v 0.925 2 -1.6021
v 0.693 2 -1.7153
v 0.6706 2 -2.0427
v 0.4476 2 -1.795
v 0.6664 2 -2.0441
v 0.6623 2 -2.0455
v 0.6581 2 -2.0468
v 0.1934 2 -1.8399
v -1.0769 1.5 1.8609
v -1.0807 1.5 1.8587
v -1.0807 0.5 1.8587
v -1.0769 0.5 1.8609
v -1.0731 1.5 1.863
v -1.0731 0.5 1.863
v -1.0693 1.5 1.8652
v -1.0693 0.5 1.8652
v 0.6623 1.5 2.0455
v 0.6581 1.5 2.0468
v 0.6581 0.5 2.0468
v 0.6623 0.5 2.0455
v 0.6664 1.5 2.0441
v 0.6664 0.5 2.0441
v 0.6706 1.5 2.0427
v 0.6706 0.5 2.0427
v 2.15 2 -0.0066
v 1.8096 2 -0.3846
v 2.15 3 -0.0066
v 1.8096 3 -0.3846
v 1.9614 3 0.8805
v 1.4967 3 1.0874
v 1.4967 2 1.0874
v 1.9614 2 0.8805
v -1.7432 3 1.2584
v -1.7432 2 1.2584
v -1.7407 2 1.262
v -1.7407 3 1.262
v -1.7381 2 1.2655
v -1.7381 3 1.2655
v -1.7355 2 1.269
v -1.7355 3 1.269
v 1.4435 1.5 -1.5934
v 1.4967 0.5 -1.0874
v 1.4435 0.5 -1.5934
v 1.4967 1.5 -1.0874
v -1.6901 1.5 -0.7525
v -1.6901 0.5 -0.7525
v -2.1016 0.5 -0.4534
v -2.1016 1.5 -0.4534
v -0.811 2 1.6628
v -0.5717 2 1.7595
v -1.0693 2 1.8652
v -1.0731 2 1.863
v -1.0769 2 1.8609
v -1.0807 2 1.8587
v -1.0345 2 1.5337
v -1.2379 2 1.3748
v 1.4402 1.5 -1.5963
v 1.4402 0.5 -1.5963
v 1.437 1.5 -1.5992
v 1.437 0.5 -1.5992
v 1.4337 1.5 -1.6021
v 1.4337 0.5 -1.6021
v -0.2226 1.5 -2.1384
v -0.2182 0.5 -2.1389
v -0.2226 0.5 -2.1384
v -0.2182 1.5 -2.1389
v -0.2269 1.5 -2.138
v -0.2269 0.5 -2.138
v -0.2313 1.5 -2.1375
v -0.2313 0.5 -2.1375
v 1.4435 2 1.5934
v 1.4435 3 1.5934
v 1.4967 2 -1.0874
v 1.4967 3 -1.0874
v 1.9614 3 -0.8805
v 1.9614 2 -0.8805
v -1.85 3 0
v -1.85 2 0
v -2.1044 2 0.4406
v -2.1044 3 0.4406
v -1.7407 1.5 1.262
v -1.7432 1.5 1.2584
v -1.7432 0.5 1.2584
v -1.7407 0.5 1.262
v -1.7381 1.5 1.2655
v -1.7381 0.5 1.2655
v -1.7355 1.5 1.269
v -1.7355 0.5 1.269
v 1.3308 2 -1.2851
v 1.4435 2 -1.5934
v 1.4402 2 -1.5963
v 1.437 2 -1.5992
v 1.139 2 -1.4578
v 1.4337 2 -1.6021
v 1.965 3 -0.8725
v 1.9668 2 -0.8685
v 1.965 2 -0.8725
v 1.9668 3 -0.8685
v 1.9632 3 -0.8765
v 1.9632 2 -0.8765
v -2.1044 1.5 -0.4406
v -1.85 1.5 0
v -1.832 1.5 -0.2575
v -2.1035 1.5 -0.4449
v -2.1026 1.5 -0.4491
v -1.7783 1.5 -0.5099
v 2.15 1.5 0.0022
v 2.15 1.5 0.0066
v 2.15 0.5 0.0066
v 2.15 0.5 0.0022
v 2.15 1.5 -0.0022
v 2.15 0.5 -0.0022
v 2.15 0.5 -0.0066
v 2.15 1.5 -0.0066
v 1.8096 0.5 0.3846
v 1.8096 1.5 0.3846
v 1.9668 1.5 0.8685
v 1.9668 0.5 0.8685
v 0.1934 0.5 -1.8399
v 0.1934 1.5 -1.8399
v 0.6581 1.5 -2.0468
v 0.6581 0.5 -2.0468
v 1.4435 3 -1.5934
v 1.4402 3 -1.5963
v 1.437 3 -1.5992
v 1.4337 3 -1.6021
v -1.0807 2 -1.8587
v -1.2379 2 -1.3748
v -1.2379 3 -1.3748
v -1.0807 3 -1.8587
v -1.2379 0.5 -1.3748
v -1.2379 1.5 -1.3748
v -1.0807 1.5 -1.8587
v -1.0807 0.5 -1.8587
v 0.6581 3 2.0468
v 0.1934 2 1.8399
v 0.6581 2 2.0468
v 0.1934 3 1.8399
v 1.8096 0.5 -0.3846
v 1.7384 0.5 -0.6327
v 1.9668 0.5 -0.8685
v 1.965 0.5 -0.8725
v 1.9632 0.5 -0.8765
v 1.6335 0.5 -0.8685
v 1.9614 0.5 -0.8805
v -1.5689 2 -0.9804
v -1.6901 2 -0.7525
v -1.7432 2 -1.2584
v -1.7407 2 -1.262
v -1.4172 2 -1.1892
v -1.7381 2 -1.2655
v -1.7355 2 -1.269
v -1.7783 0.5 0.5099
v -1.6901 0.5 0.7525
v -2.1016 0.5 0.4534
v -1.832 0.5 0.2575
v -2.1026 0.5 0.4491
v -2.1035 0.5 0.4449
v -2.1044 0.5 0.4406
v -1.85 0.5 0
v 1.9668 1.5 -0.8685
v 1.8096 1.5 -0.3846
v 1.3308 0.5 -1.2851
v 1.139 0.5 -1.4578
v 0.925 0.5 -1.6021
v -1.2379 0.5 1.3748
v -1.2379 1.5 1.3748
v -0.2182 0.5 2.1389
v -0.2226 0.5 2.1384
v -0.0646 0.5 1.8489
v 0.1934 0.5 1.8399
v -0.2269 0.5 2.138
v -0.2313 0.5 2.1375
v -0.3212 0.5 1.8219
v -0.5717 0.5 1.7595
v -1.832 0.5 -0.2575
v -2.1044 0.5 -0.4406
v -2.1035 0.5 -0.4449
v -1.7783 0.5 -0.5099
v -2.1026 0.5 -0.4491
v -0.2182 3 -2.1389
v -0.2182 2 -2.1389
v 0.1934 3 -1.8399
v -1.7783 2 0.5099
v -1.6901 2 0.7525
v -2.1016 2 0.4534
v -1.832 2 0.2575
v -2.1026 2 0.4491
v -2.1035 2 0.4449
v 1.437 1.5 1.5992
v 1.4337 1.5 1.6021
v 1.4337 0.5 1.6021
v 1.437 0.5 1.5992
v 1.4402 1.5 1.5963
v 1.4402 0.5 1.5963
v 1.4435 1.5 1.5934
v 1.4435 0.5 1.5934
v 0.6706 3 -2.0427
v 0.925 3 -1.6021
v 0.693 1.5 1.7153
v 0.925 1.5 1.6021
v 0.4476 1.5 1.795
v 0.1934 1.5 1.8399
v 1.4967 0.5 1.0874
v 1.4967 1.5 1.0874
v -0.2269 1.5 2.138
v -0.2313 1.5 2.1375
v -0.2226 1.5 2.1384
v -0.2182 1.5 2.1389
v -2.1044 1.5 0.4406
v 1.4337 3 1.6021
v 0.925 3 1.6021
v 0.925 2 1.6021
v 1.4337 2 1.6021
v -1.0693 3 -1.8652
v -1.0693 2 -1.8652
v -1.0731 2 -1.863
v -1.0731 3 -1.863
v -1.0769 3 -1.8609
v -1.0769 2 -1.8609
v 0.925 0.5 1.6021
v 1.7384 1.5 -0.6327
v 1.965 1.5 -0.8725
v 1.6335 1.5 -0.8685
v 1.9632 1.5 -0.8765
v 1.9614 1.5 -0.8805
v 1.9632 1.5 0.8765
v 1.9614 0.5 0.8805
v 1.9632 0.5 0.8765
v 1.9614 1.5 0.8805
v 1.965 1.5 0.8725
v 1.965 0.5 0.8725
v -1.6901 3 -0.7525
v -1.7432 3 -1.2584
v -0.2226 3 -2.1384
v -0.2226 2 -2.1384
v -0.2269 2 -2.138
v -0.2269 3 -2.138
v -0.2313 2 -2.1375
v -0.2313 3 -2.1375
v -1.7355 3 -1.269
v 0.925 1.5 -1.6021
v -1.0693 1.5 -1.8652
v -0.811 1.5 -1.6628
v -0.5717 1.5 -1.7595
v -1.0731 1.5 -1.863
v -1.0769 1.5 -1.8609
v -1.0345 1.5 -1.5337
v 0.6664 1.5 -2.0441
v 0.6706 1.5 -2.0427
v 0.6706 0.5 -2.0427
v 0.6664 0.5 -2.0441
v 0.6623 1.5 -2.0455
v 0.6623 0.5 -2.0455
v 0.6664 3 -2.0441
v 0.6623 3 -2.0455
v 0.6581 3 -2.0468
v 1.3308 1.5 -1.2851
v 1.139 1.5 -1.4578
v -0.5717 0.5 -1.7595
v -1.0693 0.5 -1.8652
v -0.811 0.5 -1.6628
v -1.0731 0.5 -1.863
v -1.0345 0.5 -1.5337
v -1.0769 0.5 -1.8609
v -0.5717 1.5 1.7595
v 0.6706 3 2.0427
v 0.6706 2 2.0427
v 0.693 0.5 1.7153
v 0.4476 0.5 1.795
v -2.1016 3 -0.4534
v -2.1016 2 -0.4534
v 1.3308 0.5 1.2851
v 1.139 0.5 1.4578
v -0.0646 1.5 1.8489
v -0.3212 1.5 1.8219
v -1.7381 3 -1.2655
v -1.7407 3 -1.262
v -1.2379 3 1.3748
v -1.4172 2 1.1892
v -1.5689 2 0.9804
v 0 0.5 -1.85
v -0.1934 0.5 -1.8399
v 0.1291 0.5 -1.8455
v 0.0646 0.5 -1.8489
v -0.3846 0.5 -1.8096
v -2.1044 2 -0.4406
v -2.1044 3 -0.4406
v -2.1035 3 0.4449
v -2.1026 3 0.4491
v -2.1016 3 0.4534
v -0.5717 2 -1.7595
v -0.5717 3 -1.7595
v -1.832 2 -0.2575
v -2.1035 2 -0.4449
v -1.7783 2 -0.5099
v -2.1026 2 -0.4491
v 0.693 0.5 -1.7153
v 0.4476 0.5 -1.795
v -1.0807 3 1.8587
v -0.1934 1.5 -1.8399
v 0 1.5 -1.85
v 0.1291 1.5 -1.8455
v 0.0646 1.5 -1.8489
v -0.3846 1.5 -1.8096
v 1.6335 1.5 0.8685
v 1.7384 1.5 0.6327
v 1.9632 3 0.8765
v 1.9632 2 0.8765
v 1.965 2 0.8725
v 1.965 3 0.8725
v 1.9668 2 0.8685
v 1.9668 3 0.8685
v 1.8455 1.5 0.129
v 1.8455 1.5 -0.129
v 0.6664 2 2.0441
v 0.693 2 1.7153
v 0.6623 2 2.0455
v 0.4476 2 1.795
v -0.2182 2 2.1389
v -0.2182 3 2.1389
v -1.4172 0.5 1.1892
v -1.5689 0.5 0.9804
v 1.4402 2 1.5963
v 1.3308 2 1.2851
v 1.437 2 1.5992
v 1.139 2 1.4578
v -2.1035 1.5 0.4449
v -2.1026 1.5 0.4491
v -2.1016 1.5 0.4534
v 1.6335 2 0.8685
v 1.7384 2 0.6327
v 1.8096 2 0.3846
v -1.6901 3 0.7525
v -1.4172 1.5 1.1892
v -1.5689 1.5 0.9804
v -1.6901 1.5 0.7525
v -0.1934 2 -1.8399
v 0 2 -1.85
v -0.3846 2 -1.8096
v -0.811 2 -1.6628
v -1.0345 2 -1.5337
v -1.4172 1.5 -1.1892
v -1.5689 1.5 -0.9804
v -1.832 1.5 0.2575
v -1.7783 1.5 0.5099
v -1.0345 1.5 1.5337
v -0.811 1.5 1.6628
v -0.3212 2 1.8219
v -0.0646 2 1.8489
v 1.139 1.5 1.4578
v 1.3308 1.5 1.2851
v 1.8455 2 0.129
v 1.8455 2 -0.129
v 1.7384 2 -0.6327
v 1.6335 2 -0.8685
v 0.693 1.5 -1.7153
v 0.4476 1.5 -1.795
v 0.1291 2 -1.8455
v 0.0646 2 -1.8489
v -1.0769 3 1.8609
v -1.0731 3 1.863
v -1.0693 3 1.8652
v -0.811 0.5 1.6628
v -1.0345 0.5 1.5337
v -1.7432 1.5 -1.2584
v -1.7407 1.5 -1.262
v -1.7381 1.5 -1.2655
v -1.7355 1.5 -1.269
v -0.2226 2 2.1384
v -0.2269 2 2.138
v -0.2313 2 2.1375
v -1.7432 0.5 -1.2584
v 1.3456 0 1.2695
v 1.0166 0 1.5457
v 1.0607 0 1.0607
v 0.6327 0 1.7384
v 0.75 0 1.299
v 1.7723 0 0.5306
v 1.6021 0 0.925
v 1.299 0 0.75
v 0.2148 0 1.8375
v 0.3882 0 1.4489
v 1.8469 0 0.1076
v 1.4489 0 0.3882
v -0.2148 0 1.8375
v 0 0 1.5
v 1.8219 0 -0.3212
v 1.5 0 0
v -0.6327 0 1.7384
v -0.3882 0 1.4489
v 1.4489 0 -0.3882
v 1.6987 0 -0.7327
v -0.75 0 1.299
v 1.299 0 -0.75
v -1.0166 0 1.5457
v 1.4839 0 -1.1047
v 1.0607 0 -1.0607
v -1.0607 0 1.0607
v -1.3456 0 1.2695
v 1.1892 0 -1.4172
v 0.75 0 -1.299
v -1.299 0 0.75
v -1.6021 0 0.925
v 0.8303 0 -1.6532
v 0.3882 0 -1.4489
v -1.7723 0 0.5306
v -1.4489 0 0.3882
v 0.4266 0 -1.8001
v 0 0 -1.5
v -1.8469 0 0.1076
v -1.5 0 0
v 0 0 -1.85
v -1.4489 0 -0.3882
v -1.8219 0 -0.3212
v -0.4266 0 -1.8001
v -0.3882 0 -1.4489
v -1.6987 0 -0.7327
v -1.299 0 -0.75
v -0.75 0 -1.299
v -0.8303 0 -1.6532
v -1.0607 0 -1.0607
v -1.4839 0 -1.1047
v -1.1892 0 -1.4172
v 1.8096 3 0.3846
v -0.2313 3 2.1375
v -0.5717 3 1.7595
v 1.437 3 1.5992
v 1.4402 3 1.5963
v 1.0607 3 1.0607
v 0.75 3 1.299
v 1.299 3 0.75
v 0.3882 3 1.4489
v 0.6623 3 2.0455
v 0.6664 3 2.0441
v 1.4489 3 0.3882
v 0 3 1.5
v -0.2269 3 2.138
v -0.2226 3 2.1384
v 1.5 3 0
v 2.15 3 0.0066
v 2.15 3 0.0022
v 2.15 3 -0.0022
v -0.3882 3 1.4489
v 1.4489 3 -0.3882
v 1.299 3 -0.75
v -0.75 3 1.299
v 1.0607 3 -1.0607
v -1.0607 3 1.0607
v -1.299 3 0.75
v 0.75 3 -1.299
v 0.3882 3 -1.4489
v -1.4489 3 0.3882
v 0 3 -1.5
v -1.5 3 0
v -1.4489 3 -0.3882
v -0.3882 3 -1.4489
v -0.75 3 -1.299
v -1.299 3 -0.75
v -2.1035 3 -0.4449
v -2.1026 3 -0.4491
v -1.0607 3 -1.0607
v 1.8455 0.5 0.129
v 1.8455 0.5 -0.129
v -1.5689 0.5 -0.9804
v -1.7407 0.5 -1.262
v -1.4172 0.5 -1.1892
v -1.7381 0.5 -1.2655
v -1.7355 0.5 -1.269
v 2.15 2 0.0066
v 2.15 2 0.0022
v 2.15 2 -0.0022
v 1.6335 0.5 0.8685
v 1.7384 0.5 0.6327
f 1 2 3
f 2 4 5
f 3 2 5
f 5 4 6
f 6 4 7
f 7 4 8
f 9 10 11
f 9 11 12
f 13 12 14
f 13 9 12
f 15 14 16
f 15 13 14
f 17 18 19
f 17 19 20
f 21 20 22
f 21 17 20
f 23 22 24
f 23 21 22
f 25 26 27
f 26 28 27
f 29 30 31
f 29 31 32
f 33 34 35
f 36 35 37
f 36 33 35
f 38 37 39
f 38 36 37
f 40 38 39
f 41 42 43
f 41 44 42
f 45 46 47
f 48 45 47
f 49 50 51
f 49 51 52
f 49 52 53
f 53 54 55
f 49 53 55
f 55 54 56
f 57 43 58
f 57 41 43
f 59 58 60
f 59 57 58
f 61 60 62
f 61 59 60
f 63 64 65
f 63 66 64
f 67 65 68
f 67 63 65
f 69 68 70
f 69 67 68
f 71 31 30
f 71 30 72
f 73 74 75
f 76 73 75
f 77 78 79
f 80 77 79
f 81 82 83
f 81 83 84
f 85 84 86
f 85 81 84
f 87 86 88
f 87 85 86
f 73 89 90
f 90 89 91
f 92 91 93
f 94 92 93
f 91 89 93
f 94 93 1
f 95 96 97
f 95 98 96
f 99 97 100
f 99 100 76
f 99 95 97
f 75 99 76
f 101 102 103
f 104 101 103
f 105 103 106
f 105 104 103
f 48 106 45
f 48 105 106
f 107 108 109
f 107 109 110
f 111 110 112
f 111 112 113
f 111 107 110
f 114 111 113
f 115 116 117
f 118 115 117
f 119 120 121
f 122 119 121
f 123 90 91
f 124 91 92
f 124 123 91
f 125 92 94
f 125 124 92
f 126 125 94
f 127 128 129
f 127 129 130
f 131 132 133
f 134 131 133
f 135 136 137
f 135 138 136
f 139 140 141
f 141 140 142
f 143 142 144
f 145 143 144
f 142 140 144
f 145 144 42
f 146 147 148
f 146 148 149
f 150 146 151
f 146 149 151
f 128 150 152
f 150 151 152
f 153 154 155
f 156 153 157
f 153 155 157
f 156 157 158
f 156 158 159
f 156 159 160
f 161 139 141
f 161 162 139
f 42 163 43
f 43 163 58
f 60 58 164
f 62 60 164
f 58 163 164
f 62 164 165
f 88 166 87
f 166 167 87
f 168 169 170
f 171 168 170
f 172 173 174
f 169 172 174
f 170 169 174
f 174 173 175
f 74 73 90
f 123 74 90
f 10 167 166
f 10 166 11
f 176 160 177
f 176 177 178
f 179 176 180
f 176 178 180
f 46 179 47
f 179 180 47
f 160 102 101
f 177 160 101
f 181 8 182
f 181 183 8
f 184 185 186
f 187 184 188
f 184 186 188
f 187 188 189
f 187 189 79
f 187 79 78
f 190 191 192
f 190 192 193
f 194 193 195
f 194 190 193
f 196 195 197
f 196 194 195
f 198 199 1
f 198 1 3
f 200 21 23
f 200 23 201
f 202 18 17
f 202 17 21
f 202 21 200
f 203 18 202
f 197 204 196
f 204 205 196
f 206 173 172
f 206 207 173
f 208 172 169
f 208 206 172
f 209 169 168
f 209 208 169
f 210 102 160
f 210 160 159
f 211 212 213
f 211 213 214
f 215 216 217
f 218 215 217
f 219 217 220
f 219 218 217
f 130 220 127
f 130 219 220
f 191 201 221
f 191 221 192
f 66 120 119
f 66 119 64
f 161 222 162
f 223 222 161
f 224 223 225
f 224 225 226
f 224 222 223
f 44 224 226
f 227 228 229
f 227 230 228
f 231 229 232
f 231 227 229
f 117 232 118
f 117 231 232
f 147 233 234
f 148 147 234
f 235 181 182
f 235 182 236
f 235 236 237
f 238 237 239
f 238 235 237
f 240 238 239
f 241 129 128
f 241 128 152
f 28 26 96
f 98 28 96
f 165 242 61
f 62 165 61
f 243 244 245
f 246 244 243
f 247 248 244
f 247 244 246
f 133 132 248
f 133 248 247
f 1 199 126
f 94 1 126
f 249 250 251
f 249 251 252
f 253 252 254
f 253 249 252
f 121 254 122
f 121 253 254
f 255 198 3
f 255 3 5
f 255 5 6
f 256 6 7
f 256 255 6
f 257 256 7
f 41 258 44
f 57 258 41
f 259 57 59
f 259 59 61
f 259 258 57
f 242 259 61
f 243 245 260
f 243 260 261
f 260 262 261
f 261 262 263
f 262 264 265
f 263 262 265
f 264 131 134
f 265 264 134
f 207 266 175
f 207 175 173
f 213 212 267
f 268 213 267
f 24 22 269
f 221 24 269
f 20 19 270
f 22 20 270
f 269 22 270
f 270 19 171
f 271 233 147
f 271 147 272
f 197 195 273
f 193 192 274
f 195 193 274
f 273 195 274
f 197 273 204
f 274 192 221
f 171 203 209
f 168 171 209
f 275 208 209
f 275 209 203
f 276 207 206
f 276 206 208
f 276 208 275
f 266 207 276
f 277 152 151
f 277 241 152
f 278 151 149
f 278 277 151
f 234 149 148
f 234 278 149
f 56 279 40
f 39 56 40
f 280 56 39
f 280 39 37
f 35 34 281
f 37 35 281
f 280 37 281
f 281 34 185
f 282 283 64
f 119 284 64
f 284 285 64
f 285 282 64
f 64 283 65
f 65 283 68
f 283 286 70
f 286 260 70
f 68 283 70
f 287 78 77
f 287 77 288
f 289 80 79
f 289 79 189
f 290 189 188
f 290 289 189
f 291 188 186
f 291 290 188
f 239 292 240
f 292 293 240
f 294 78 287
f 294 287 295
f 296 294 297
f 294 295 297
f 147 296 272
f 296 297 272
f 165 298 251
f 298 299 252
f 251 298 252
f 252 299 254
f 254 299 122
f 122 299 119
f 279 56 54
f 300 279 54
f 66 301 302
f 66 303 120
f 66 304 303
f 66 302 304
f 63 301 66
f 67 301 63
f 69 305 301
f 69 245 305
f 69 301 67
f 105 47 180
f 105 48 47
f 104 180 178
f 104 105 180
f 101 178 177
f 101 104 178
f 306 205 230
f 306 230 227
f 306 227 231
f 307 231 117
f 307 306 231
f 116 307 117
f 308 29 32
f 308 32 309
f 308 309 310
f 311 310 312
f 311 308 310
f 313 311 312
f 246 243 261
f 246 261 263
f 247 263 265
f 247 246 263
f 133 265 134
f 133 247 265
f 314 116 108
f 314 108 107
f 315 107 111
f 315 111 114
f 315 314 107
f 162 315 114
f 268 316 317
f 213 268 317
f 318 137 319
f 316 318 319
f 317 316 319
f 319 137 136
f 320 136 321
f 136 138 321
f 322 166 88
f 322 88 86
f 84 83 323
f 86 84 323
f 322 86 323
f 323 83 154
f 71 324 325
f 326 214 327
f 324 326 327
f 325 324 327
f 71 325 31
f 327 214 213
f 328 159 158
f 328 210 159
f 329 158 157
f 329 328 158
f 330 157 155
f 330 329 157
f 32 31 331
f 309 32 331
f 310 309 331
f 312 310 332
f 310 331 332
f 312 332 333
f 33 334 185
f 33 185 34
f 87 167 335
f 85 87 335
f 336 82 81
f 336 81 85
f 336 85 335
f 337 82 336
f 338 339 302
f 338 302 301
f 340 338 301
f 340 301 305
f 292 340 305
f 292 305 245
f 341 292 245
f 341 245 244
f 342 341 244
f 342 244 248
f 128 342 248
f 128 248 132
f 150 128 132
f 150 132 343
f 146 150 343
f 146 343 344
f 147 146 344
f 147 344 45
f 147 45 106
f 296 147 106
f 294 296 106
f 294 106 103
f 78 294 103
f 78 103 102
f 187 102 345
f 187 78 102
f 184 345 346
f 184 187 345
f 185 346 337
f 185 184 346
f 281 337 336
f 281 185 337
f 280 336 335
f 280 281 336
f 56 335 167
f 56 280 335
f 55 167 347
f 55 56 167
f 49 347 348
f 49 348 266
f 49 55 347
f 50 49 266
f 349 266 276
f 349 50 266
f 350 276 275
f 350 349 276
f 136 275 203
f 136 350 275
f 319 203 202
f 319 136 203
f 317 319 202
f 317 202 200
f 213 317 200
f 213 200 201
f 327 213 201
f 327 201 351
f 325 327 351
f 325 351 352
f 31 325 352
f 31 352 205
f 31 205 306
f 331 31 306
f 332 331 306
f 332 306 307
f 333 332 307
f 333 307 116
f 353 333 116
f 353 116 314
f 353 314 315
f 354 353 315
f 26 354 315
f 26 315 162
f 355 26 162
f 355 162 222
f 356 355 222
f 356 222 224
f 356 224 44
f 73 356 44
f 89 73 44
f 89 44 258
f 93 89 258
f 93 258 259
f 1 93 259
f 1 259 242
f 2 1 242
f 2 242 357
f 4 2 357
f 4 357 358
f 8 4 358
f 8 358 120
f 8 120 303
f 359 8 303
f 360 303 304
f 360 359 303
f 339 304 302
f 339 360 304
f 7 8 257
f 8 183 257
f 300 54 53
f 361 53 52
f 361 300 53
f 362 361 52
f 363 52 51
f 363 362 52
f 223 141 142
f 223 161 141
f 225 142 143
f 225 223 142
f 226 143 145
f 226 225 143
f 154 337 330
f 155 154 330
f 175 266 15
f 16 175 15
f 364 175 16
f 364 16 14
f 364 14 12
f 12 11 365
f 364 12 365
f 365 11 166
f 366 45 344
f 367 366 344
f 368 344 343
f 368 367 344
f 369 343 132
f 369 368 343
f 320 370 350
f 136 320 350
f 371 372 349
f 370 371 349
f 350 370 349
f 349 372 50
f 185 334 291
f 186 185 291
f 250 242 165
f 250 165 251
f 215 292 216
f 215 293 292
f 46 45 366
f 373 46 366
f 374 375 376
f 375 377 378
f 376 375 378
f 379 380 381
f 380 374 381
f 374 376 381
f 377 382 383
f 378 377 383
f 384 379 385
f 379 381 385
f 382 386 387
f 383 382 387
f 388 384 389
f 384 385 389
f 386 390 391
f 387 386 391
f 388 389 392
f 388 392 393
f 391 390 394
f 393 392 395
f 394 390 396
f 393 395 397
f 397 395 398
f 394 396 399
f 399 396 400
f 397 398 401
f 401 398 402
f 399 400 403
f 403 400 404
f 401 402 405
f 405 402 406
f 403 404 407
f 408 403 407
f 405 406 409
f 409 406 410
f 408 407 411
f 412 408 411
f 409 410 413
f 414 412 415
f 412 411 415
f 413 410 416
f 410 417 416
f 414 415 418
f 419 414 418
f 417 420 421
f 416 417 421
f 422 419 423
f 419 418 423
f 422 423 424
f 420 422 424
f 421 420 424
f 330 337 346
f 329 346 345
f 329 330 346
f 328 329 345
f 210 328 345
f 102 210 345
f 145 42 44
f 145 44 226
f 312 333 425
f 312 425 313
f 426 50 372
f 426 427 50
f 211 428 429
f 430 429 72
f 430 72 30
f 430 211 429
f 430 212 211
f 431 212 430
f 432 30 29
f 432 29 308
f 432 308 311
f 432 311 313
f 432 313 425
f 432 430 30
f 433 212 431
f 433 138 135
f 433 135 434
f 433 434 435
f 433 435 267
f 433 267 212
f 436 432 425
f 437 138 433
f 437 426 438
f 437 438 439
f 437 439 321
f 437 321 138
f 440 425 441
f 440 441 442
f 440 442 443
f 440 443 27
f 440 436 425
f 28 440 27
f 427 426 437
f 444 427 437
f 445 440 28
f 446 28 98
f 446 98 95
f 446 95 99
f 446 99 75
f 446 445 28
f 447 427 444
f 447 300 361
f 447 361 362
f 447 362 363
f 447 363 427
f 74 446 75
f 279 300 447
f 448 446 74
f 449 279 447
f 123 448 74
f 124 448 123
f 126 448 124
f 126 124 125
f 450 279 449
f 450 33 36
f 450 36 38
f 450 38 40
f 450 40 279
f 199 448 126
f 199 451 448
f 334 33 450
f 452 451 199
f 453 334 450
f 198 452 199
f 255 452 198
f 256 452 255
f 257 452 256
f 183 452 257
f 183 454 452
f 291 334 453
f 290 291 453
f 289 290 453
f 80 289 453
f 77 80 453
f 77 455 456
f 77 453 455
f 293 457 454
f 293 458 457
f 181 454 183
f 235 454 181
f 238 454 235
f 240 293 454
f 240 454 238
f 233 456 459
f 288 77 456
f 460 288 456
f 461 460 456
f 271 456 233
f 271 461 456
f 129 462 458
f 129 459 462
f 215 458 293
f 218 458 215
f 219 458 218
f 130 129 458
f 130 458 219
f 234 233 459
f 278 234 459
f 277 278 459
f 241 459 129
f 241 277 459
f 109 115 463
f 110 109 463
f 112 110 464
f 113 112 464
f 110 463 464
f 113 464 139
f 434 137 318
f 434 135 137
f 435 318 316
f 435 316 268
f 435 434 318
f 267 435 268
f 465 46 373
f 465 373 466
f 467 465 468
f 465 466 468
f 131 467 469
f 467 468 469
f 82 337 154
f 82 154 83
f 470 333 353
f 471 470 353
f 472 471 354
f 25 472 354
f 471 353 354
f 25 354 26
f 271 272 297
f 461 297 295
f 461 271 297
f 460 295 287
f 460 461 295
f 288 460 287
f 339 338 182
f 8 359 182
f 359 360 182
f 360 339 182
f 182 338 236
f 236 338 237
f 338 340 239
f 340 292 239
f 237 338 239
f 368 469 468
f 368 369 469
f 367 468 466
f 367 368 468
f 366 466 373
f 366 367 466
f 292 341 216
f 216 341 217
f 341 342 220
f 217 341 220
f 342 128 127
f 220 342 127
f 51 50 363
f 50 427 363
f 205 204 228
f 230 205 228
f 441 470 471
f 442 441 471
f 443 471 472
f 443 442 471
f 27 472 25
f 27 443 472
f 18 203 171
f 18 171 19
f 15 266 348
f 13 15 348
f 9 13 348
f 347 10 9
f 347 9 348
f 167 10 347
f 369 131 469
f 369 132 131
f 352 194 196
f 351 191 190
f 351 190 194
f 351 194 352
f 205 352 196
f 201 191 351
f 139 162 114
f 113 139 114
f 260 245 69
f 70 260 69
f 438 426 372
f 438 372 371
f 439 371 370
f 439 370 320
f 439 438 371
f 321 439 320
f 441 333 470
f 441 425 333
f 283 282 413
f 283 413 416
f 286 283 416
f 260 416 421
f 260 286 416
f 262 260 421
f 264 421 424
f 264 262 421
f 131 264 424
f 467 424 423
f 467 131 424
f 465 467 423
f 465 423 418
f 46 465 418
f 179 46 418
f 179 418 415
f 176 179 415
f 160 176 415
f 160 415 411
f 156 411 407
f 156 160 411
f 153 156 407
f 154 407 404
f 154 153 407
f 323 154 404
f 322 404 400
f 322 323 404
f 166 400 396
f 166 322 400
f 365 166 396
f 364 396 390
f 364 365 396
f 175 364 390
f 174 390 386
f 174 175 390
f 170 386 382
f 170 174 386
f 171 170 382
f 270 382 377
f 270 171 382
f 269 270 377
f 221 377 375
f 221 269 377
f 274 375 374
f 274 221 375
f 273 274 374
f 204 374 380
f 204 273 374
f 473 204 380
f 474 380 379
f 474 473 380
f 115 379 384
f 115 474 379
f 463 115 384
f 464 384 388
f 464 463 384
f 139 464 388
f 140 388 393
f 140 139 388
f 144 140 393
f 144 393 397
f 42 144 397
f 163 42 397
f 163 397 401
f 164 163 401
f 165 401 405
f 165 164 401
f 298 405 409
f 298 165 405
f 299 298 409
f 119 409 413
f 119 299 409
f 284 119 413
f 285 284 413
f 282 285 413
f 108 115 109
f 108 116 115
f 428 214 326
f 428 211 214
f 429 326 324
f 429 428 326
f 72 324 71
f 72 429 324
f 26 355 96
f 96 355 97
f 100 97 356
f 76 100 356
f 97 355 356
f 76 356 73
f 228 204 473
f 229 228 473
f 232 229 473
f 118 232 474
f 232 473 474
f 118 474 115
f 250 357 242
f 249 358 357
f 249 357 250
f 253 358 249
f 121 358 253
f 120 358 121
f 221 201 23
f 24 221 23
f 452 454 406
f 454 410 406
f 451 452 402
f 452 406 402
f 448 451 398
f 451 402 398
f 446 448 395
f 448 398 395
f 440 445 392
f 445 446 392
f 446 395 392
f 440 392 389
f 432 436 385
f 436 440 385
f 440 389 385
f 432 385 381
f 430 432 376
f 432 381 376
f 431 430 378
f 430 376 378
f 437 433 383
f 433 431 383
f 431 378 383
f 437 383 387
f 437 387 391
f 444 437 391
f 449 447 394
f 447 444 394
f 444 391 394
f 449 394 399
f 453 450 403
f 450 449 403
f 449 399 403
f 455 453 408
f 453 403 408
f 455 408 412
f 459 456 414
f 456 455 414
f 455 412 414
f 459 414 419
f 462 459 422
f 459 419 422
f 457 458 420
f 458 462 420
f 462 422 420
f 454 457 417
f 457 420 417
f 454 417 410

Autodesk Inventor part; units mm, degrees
ref_plane "YZ Plane" through (0, 0, 0) normal (1, 0, 0) x (0, 1, 0)
ref_plane "XZ Plane" through (0, 0, 0) normal (0, 1, 0) x (-1, 0, 0)
ref_plane "XY Plane" through (0, 0, 0) normal (0, 0, 1) x (1, 0, 0)
sketch "Szkic1" plane through (0, 0, 0) normal (1, 0, 0) x (0, 1, 0)
  line L0 (0, 0) -> (3, 0)
  line L1 (3, 0) -> (3, -1.5)
  line L2 (3, -1.5) -> (0, -1.5)
  line L3 (0, -1.5) -> (0, 0)
  line L4 (3, -1.5) -> (0, -1.5)
  line L5 (0, -1.5) -> (0, -1.85)
  line L6 (0, -1.85) -> (3, -1.85)
  line L7 (3, -1.85) -> (3, -1.5)
  line L8 (3, -1.5) -> (0, -1.5)
  line L9 (0, -1.5) -> (0, -2.15)
  line L10 (0, -2.15) -> (3, -2.15)
  line L11 (3, -2.15) -> (3, -1.5)
  line L12 (3, -1.85) -> (2, -1.85)
  line L13 (2, -1.85) -> (2, -2.15)
  line L14 (2, -2.15) -> (3, -2.15)
  line L15 (3, -2.15) -> (3, -1.85)
  line L16 (0.5, -2.15) -> (1.5, -2.15)
  line L17 (1.5, -2.15) -> (1.5, -1.85)
  line L18 (1.5, -1.85) -> (0.5, -1.85)
  line L19 (0.5, -1.85) -> (0.5, -2.15)
  dimension "d0" = 3
  dimension "d1" = 1.5
  dimension "d2" = 3
  dimension "d3" = 0.35
  dimension "d4" = 3
  dimension "d5" = 0.65
  dimension "d6" = 1
  dimension "d7" = 1
  dimension "d8" = 2.5
revolve "Obrót1" add sketch "Szkic1" angle 360 about axis through (0, 0, 0) along (0, 1, 0) contours L2 L7 L6 L5 | L11 L10 L13 L6 | L6 L17 L10 L19
thread "Gwint1" size "M3x0.5" class "6H" standard "ANSI Metric M Profile" full length
sketch "Szkic2" plane through (0, 3, 0) normal (0, 1, 0) x (1, 0, 0)
  circle A0 centre (0, 0) radius 1.85 projected
  circle A1 centre (0, 0) radius 1.5 projected
  circle A2 centre (0, 0) radius 2.15 projected
  line L0 (0, 0) -> (-2.15, 0)
  line L1 (-1.85, 0) -> (-2.1044, -0.4406)
  line L2 (-1.85, 0) -> (-2.1044, 0.4406)
  line L3 (-1.6901, -0.7525) -> (-1.7432, -1.2584)
  line L4 (-1.6901, -0.7525) -> (-2.1016, -0.4534)
  line L5 (-1.2379, -1.3748) -> (-1.0807, -1.8587)
  line L6 (-1.2379, -1.3748) -> (-1.7355, -1.269)
  line L7 (-0.5717, -1.7595) -> (-0.2313, -2.1375)
  line L8 (-0.5717, -1.7595) -> (-1.0693, -1.8652)
  line L9 (0.1934, -1.8399) -> (0.6581, -2.0468)
  line L10 (0.1934, -1.8399) -> (-0.2182, -2.1389)
  line L11 (0.925, -1.6021) -> (1.4337, -1.6021)
  line L12 (0.925, -1.6021) -> (0.6706, -2.0427)
  line L13 (1.4967, -1.0874) -> (1.9614, -0.8805)
  line L14 (1.4967, -1.0874) -> (1.4435, -1.5934)
  line L15 (1.8096, -0.3846) -> (2.15, -0.0066)
  line L16 (1.8096, -0.3846) -> (1.9668, -0.8685)
  line L17 (1.8096, 0.3846) -> (1.9668, 0.8685)
  line L18 (1.8096, 0.3846) -> (2.15, 0.0066)
  line L19 (1.4967, 1.0874) -> (1.4435, 1.5934)
  line L20 (1.4967, 1.0874) -> (1.9614, 0.8805)
  line L21 (0.925, 1.6021) -> (0.6706, 2.0427)
  line L22 (0.925, 1.6021) -> (1.4337, 1.6021)
  line L23 (0.1934, 1.8399) -> (-0.2182, 2.1389)
  line L24 (0.1934, 1.8399) -> (0.6581, 2.0468)
  line L25 (-0.5717, 1.7595) -> (-1.0693, 1.8652)
  line L26 (-0.5717, 1.7595) -> (-0.2313, 2.1375)
  line L27 (-1.2379, 1.3748) -> (-1.7355, 1.269)
  line L28 (-1.2379, 1.3748) -> (-1.0807, 1.8587)
  line L29 (-1.6901, 0.7525) -> (-2.1016, 0.4534)
  line L30 (-1.6901, 0.7525) -> (-1.7432, 1.2584)
  point P0 (-0.2182, 2.1389)
  point P1 (-0.2182, -2.1389)
  dimension "d13" = 60
  dimension "d14" = 60
  dimension "d17" = 360
extrude "Wyciągnięcie proste1" cut sketch "Szkic2" against normal blind 10 contours L17 A2 L18 | L15 A2 L16 | L19 A2 L20 | L13 A2 L14 | L21 A2 L22 | L11 A2 L12 | L23 A2 L24 | L9 A2 L10 | L25 A2 L26 | L7 A2 L8 | L27 A2 L28 | L5 A2 L6 | L29 A2 L30 | L3 A2 L4 | L1 A2 L0 | L0 A2 L2
properties part number "insert-M3-3x4.2" material "Mosiądz, miękki żółty"
